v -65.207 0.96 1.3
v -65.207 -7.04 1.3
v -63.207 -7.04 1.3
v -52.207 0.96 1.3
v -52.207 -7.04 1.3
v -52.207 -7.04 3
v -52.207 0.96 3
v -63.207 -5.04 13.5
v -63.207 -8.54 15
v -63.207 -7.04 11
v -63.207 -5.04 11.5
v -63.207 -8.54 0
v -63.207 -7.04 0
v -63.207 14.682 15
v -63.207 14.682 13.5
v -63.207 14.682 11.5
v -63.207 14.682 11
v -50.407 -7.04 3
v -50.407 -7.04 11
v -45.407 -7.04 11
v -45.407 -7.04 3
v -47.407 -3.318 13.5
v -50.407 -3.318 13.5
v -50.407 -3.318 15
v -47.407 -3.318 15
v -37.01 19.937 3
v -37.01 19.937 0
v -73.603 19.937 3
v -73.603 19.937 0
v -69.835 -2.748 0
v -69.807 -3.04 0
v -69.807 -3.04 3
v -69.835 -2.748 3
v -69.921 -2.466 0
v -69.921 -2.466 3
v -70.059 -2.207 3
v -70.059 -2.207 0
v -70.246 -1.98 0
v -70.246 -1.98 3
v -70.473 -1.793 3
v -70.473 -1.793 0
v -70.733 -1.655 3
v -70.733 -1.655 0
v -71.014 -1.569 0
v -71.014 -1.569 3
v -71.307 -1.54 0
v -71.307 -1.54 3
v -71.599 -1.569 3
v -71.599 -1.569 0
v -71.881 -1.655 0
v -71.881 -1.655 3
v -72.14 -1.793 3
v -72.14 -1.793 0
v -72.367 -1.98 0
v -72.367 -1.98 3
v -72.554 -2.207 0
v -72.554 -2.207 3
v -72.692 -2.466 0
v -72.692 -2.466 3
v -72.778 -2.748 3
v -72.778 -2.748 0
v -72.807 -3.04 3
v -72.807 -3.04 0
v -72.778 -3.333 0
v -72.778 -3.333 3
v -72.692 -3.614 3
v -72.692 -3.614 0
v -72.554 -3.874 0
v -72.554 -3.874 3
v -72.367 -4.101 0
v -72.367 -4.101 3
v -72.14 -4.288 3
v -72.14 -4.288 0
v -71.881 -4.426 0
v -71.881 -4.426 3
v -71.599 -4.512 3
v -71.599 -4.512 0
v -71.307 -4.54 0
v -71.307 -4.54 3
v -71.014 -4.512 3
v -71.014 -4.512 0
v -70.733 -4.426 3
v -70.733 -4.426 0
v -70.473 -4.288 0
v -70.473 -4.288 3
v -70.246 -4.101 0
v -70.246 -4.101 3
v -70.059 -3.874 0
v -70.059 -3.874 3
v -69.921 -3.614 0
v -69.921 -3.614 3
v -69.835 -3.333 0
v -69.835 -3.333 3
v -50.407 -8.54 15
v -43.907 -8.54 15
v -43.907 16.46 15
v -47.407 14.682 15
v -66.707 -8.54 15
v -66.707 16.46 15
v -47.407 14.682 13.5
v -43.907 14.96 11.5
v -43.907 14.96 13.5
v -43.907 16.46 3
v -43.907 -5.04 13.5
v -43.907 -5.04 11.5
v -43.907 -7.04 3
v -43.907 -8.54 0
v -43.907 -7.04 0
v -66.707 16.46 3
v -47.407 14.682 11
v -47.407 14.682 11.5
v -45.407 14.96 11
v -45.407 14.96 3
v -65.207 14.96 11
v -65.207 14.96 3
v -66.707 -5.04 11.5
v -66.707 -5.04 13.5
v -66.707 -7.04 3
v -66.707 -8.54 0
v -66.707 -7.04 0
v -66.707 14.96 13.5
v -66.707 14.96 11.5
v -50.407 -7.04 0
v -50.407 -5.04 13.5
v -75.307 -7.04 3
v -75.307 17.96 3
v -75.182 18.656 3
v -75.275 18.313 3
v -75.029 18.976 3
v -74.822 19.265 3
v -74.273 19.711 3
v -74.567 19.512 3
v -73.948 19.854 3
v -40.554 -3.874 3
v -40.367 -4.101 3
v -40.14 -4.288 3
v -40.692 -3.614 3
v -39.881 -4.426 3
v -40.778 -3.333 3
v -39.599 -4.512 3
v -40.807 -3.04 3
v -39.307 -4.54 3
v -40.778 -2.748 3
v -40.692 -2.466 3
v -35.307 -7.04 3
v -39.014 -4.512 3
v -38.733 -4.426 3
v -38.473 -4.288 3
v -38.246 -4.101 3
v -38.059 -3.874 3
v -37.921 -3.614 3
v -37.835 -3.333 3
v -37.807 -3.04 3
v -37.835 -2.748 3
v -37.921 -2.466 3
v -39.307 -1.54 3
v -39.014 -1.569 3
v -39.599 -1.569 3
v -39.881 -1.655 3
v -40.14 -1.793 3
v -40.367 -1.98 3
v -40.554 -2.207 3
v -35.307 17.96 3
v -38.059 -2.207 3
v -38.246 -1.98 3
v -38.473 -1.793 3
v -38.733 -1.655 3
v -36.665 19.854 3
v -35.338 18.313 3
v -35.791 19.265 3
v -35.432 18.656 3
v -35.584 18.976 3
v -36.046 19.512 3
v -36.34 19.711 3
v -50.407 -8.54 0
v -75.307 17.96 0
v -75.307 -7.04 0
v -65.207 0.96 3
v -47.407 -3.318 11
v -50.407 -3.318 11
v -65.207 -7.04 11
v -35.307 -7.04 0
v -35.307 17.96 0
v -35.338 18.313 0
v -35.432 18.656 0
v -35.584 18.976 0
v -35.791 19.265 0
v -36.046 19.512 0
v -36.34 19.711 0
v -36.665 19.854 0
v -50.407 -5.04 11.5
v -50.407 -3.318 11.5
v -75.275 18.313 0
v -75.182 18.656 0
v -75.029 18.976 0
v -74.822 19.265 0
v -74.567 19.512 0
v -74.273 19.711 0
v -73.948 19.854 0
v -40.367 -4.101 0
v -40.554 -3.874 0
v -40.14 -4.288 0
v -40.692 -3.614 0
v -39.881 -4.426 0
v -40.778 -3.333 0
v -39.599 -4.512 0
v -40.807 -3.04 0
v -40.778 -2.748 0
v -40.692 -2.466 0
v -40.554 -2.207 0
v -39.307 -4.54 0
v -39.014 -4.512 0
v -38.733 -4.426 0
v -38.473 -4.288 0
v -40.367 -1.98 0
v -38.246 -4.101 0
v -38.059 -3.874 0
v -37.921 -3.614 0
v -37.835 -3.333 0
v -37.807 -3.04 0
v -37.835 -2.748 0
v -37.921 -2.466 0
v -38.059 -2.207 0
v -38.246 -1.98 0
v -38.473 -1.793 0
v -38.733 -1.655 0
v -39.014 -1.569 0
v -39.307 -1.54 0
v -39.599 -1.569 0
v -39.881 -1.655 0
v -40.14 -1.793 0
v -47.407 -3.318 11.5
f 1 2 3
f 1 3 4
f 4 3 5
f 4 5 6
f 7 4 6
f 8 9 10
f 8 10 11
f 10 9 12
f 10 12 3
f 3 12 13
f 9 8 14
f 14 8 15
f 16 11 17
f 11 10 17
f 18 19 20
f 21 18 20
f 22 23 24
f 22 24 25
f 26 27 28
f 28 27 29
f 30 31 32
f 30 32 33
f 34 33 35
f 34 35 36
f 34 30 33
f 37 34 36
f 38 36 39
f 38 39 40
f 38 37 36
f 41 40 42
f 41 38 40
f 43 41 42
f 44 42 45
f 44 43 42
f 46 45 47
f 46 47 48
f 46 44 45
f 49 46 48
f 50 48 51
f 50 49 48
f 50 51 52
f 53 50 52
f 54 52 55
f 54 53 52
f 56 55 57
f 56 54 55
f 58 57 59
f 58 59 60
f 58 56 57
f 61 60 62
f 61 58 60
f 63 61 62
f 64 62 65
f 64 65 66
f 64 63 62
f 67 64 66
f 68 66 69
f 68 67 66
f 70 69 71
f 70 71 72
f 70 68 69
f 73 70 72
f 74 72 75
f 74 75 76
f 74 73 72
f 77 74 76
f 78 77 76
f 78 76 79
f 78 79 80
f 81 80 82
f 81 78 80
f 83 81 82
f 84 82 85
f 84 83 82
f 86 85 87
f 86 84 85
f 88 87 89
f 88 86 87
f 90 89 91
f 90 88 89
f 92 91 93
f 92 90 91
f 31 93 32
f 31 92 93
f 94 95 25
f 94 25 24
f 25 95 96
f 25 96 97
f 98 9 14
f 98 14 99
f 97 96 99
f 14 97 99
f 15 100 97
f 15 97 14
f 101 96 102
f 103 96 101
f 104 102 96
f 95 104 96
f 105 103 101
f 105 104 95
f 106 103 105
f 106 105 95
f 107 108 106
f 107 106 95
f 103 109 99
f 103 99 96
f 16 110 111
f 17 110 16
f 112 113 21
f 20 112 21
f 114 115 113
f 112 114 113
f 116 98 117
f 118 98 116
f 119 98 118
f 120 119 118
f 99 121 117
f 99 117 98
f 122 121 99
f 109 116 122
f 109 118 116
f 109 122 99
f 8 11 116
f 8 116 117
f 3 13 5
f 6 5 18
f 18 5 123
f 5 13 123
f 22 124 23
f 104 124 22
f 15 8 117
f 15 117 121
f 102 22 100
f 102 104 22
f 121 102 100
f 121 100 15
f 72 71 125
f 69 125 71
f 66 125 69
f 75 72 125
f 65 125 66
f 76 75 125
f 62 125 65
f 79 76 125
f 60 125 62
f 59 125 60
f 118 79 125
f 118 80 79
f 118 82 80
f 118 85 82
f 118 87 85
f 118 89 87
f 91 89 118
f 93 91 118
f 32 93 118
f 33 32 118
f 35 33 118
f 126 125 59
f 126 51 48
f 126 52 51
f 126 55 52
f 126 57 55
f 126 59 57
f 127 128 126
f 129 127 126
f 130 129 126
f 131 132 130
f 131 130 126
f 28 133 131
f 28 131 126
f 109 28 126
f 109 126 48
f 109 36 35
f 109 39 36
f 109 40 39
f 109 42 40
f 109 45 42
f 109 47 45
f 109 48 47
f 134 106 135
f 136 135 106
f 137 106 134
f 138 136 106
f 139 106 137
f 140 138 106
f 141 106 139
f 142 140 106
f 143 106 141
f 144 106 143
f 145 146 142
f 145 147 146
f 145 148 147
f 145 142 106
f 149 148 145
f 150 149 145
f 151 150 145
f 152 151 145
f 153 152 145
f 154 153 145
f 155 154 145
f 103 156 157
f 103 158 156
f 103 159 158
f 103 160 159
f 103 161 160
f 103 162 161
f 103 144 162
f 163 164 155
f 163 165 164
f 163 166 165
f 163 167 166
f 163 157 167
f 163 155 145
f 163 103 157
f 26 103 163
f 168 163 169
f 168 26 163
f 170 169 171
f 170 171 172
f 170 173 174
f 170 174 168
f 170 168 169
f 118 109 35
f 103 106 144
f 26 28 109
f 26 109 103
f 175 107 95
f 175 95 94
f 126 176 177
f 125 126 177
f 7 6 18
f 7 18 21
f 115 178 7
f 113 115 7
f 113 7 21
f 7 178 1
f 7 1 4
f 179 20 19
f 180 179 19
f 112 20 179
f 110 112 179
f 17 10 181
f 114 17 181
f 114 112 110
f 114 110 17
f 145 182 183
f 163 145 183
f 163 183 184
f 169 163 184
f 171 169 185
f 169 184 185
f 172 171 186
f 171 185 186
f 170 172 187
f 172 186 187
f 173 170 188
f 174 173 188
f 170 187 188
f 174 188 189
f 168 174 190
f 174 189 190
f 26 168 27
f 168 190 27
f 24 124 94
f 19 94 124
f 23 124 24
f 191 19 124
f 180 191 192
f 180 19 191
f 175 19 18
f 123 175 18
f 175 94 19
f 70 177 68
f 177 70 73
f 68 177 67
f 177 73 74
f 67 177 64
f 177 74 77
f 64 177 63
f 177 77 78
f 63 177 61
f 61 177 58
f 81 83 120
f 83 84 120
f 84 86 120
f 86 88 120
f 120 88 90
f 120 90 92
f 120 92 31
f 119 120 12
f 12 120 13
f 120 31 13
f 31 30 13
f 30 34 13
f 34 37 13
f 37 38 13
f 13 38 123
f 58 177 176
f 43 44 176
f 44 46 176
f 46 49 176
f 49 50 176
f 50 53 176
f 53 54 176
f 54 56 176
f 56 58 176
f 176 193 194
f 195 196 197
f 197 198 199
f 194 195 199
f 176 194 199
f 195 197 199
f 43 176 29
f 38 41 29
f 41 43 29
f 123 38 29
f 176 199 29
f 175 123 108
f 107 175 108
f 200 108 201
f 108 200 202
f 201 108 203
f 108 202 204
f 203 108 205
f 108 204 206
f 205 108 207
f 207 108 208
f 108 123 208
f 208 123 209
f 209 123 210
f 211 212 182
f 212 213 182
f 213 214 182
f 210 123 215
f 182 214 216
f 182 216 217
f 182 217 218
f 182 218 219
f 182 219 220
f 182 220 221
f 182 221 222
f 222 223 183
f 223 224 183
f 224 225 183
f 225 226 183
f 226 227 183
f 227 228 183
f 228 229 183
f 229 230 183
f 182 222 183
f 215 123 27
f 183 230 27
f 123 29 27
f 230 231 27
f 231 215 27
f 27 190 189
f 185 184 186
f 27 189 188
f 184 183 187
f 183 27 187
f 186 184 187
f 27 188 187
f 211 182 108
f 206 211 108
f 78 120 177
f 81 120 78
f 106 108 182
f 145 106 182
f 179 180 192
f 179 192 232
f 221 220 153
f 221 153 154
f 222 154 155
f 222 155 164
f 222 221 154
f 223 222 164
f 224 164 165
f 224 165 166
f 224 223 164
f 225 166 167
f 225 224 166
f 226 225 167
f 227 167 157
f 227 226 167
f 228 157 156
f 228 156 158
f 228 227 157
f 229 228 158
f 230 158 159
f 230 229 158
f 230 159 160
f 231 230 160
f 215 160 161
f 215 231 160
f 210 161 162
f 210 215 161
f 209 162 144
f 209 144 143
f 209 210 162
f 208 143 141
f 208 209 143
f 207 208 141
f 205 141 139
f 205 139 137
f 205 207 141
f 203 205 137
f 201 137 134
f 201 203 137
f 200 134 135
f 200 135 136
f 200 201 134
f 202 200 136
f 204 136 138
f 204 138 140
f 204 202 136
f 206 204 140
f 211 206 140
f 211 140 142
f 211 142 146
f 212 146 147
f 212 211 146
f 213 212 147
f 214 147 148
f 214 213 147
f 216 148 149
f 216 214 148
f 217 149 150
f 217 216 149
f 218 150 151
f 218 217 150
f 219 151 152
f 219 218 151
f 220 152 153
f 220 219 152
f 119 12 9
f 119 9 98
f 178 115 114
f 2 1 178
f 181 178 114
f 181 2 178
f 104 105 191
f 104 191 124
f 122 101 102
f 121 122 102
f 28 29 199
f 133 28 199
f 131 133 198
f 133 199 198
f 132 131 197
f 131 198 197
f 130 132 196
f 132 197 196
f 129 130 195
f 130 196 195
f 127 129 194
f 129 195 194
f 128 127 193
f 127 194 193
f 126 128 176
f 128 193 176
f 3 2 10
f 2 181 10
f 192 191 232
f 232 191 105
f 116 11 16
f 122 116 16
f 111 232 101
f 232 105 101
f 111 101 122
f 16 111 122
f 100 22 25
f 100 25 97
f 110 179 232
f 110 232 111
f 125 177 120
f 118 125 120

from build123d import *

# Parameters (mm, degrees)
CROQUIS1_R              = 1.5
SALIENTE_EXTRUIR1_DEPTH = 3
SALIENTE_EXTRUIR2_DEPTH = 8
CROQUIS3_W              = 13
CROQUIS3_H              = 1.7
CORTAR_EXTRUIR1_DEPTH   = 8
CROQUIS5_W              = 3.5
CROQUIS5_H              = 11
CROQUIS5_W_2            = 6.5
SALIENTE_EXTRUIR3_DEPTH = 1.5
SALIENTE_EXTRUIR4_DEPTH = 4
CORTAR_EXTRUIR2_START   = -22.8
CROQUIS11_W             = 2
CROQUIS11_H             = 20
CORTAR_EXTRUIR2_DEPTH   = 22.8


with BuildPart() as part:
    # Croquis1 → Saliente-Extruir1 (new body)
    with BuildSketch(Plane.XY):
        with BuildLine():
            Line((-75.306602598, 17.959617496), (-75.306602598, -7.040382504))
            Line((-75.306602598, -7.040382504), (-35.306602598, -7.040382504))
            Line((-35.306602598, -7.040382504), (-35.306602598, 17.959617496))
            ThreePointArc((-35.306602598, 17.959617496), (-35.791122177, 19.26473017), (-37.009921692, 19.937490201))
            Line((-37.009921692, 19.937490201), (-73.603283504, 19.937490201))
            ThreePointArc((-73.603283504, 19.937490201), (-74.822083019, 19.26473017), (-75.306602598, 17.959617496))
        make_face()
        with Locations((-71.306602598, -3.040382504)):
            Circle(CROQUIS1_R, mode=Mode.SUBTRACT)
        with Locations((-39.306602598, -3.040382504)):
            Circle(CROQUIS1_R, mode=Mode.SUBTRACT)
    extrude(amount=SALIENTE_EXTRUIR1_DEPTH)

    # Croquis2 → Saliente-Extruir2 (add)
    with BuildSketch(Plane.XY.offset(3)):
        Polygon((-66.706602598, -7.040382504), (-65.206602598, -7.040382504), (-65.206602598, 14.959617496), (-45.406602598, 14.959617496), (-45.406602598, -7.040382504), (-43.906602598, -7.040382504), (-43.906602598, 16.459617496), (-66.706602598, 16.459617496), align=None)
    extrude(amount=SALIENTE_EXTRUIR2_DEPTH)

    # Croquis3 → Cortar-Extruir1 (cut)
    with BuildSketch(Plane.XZ.offset(7.040382504)):
        with Locations((-58.706602598, 2.15)):
            Rectangle(CROQUIS3_W, CROQUIS3_H)
    extrude(amount=-CORTAR_EXTRUIR1_DEPTH, mode=Mode.SUBTRACT)

    # Croquis5 → Saliente-Extruir3 (add)
    with BuildSketch(Plane.XZ.offset(7.040382504)):
        with Locations((-64.956602598, 5.5)):
            Rectangle(CROQUIS5_W, CROQUIS5_H)
        with Locations((-47.156602598, 5.5)):
            Rectangle(CROQUIS5_W_2, CROQUIS5_H)
    extrude(amount=SALIENTE_EXTRUIR3_DEPTH)

    # Croquis6 → Saliente-Extruir4 (add)
    with BuildSketch(Plane.XY.offset(11)):
        Polygon((-63.206602598, -7.040382504), (-63.206602598, -8.540382504), (-66.706602598, -8.540382504), (-66.706602598, 16.459617496), (-43.906602598, 16.459617496), (-43.906602598, -8.540382504), (-50.406602598, -8.540382504), (-50.406602598, -3.318007663), (-47.406602598, -3.318007663), (-47.406602598, 14.681992337), (-63.206602598, 14.681992337), align=None)
    extrude(amount=SALIENTE_EXTRUIR4_DEPTH)

    # Croquis11 → Cortar-Extruir2 (cut)
    with BuildSketch(Plane.ZY.offset(66.706602598).offset(CORTAR_EXTRUIR2_START)):
        with Locations((12.5, 4.959617496)):
            Rectangle(CROQUIS11_W, CROQUIS11_H)
    extrude(amount=CORTAR_EXTRUIR2_DEPTH, mode=Mode.SUBTRACT)


solid = part.part
